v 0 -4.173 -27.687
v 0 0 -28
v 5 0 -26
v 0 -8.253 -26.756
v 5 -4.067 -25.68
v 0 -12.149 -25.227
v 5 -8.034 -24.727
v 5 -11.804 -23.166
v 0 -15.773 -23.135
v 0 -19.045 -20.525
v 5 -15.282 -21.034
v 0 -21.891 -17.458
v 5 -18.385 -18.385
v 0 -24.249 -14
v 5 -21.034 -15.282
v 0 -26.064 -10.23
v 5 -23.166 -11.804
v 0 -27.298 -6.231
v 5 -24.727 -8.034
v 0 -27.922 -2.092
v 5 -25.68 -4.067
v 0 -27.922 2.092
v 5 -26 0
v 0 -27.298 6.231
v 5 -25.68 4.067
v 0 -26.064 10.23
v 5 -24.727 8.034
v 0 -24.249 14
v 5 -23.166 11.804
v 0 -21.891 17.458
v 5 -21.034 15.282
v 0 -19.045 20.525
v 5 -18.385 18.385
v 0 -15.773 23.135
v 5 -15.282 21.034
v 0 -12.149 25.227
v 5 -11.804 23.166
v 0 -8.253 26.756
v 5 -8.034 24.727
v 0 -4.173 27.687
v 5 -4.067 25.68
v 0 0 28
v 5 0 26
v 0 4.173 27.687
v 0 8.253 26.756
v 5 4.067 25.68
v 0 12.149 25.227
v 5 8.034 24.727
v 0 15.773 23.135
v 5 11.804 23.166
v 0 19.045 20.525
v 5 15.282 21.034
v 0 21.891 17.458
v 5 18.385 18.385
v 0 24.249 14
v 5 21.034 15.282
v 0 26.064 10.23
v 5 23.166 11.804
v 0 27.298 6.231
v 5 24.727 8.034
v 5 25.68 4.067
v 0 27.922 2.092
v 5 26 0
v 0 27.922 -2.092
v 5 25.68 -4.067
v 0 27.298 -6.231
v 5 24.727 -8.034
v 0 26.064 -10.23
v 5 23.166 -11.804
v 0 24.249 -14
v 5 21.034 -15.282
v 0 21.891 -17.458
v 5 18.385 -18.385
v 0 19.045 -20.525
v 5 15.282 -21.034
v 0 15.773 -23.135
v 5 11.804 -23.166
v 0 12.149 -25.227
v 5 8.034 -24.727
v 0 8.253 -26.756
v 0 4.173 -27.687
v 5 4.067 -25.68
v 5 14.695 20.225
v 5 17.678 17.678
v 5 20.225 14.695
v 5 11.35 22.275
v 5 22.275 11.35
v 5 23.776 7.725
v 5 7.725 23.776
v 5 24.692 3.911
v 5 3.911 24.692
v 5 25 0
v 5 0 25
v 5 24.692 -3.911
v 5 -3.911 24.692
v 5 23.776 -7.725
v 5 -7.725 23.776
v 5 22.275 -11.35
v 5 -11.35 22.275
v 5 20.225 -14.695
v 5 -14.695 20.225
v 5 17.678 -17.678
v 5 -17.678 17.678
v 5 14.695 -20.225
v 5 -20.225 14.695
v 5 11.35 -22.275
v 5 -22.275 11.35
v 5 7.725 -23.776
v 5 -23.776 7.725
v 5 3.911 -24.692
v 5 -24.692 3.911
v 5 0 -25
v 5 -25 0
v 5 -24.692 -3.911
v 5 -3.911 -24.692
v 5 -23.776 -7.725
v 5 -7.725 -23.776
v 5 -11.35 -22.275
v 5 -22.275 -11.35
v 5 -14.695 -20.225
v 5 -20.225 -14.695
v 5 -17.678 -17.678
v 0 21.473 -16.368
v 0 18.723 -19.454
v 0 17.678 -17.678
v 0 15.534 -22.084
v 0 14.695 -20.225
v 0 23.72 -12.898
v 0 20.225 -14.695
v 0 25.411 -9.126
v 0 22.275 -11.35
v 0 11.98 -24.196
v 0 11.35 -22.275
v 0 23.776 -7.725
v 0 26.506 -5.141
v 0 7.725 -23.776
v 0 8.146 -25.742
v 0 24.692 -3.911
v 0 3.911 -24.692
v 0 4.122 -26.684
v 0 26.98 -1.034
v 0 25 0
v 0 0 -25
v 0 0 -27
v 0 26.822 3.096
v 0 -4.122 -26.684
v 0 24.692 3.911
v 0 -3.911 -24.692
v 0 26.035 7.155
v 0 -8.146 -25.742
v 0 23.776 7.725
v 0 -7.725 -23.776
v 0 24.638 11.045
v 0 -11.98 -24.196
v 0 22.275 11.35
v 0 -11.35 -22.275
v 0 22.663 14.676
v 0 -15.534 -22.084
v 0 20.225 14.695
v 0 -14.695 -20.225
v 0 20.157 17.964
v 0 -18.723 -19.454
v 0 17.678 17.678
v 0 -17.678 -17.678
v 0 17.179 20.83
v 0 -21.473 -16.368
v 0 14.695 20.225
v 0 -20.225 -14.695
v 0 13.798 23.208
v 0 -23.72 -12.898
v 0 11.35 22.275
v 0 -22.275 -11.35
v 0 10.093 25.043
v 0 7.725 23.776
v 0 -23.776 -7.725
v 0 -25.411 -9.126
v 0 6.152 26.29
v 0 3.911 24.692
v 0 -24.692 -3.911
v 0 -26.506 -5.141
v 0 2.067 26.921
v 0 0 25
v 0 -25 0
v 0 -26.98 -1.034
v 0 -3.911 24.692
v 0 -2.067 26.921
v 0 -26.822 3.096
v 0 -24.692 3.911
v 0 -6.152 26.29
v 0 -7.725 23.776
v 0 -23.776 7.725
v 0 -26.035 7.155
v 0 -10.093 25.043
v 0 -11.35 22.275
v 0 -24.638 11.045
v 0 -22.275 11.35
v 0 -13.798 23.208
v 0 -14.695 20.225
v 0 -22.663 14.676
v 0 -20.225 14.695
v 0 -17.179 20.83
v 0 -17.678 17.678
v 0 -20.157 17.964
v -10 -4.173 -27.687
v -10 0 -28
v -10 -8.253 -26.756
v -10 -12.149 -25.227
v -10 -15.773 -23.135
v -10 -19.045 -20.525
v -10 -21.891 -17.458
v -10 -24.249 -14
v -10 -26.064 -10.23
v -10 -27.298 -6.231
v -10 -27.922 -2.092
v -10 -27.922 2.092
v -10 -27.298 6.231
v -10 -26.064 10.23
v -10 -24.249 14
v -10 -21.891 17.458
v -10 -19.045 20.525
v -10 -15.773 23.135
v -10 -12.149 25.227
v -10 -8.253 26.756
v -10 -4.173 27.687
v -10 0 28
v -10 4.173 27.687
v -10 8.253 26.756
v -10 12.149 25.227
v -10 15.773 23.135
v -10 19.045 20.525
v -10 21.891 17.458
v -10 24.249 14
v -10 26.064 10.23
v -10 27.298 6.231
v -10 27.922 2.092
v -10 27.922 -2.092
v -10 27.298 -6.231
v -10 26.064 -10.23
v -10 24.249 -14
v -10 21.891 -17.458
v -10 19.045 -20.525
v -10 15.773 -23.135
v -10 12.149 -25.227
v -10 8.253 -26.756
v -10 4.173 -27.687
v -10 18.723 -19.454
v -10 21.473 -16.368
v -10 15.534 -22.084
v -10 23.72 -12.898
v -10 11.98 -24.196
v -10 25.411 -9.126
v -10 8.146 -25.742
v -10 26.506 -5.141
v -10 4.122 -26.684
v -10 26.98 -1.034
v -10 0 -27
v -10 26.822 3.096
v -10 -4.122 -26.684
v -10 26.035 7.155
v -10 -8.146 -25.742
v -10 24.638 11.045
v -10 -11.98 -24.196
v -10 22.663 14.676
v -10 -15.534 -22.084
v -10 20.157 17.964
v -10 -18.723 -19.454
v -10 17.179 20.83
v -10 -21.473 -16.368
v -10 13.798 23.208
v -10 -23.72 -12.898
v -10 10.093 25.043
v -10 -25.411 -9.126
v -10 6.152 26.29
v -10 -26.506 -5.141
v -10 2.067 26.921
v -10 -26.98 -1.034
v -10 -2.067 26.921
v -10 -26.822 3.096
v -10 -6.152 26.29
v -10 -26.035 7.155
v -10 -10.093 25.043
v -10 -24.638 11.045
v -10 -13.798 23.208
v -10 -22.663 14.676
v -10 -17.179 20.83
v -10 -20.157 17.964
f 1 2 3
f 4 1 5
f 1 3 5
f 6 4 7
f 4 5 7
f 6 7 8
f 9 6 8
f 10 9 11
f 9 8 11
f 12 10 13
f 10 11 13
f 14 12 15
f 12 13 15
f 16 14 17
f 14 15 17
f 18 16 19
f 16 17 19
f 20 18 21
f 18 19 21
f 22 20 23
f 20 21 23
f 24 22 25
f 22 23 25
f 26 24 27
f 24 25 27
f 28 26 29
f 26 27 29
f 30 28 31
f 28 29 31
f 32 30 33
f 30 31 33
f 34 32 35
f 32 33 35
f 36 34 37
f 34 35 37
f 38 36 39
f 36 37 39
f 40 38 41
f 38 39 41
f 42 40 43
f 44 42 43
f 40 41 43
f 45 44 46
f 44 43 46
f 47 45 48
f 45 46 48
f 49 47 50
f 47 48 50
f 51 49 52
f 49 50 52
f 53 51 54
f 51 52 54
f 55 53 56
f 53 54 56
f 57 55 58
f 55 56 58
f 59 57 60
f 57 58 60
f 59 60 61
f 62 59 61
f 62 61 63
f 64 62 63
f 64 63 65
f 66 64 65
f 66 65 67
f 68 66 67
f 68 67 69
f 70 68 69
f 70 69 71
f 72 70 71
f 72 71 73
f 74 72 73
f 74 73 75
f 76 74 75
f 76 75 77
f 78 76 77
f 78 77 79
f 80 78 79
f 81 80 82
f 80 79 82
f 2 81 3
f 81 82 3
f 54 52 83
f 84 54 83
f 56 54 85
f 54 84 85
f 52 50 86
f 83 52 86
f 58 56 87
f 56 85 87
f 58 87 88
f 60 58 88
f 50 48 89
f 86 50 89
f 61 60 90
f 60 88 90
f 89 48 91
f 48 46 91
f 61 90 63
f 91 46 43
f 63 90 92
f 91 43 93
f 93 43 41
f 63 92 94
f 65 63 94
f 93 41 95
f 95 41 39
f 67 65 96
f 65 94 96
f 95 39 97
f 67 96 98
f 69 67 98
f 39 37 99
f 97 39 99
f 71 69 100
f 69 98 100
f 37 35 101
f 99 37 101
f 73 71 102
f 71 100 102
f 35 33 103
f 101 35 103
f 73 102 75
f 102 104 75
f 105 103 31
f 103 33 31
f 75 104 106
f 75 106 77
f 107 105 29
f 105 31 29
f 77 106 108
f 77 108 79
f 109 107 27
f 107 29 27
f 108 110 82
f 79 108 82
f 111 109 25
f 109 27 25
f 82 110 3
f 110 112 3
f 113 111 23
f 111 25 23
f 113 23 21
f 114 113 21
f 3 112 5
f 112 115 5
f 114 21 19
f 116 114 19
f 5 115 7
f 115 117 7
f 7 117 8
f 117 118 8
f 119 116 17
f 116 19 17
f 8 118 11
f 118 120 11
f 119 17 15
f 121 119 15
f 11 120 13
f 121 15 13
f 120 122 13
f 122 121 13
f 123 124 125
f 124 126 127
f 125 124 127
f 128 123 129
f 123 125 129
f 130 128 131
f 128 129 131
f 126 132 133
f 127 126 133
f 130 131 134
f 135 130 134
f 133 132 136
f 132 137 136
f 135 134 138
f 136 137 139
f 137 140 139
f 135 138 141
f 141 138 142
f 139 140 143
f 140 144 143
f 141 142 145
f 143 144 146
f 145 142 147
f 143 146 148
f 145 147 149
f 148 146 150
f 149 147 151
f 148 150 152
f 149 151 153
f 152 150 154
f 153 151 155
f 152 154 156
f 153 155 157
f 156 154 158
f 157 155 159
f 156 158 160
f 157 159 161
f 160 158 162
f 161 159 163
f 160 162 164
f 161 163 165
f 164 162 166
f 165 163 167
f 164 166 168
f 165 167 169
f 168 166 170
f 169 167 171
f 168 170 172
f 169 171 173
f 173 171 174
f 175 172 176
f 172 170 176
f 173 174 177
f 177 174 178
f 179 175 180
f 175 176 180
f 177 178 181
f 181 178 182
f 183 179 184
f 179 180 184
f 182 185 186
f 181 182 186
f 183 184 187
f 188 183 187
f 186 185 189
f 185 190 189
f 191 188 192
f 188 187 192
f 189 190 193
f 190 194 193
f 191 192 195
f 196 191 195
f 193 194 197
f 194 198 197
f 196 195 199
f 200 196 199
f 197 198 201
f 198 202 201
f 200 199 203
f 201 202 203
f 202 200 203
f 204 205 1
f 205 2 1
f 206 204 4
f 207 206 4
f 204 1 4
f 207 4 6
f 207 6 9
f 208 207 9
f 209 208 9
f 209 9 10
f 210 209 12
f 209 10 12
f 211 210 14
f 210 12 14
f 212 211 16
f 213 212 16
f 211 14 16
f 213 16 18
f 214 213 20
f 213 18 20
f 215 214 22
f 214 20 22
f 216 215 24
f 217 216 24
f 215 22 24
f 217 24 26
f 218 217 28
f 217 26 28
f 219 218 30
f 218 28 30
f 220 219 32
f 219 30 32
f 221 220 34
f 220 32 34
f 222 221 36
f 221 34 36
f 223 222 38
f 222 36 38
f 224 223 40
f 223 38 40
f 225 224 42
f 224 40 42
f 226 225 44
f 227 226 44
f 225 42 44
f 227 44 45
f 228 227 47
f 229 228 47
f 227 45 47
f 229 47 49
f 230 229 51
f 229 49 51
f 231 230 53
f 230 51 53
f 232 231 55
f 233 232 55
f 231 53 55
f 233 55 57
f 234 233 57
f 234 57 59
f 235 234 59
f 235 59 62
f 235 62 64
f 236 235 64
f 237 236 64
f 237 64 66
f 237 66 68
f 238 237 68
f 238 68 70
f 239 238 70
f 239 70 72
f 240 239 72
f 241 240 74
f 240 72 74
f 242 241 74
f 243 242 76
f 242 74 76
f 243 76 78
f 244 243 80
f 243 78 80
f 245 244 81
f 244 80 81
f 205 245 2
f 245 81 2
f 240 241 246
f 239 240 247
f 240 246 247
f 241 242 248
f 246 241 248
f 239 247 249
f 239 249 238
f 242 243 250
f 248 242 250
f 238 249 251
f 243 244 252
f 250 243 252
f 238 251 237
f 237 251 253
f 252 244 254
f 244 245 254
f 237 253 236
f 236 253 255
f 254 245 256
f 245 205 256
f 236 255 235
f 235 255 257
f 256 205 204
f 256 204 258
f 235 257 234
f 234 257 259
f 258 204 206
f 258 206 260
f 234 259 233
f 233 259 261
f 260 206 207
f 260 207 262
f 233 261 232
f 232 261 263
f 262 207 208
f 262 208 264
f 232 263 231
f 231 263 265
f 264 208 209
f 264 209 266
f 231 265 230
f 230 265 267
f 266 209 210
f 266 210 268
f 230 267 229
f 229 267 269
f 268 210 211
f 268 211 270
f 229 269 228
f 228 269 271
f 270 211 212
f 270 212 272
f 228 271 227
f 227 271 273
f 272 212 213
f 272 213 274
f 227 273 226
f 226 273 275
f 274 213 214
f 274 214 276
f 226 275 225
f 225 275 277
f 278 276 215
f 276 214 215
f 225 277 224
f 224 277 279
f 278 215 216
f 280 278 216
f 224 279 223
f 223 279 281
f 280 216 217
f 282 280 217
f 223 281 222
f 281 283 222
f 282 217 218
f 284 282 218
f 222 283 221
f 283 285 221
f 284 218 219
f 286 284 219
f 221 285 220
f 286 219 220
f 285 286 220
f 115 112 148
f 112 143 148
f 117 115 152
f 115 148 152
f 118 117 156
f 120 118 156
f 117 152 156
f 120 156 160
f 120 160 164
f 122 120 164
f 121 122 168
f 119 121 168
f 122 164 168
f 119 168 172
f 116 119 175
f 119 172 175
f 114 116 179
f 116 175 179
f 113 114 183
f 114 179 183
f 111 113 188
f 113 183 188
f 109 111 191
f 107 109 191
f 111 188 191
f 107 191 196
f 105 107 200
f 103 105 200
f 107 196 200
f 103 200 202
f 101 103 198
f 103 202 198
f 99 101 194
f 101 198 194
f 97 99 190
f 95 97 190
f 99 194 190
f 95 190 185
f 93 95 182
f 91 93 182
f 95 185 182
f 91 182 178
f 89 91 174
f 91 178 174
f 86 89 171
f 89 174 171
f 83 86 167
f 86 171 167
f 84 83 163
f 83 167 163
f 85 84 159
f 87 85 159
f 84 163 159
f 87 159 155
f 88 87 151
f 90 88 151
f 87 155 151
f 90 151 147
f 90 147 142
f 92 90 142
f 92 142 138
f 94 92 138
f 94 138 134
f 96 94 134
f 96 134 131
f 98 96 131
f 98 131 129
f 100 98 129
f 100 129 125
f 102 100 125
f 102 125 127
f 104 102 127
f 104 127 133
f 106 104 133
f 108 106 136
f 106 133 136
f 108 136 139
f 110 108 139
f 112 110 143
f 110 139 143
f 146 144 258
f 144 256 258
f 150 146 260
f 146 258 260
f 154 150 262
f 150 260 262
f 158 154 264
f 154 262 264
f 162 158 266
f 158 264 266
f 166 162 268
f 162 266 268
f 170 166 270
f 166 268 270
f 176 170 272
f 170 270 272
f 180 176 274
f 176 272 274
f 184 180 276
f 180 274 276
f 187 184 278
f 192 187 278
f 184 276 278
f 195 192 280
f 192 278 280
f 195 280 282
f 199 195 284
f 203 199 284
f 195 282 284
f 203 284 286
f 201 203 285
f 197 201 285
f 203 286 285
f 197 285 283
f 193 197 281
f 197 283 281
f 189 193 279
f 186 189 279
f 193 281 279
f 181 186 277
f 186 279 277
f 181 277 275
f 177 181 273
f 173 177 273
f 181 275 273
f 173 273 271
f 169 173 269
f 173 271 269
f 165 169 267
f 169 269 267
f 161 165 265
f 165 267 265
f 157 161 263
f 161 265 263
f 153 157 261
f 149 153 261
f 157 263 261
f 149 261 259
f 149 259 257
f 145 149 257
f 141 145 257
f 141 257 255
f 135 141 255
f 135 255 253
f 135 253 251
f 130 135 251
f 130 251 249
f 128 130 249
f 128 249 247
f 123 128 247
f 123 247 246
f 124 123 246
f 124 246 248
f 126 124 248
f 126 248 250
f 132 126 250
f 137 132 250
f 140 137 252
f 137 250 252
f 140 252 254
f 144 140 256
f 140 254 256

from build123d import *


with BuildPart() as part:
    # Esquisse2 → Base-Révolution (revolve)
    with BuildSketch(Plane(origin=(0, 0, 0), x_dir=(1, 0, 0), z_dir=(0, 1, 0)), mode=Mode.PRIVATE) as base_r_volution_sk:
        Polygon((0, -25), (0, -27), (-10, -27), (-10, -28), (0, -28), (5, -26), (5, -25), align=None)
    revolve(base_r_volution_sk.sketch.rotate(Axis((37.900503033, 0, 0), (-1, 0, 0)), 180), axis=Axis((37.900503033, 0, 0), (-1, 0, 0)))


solid = part.part
